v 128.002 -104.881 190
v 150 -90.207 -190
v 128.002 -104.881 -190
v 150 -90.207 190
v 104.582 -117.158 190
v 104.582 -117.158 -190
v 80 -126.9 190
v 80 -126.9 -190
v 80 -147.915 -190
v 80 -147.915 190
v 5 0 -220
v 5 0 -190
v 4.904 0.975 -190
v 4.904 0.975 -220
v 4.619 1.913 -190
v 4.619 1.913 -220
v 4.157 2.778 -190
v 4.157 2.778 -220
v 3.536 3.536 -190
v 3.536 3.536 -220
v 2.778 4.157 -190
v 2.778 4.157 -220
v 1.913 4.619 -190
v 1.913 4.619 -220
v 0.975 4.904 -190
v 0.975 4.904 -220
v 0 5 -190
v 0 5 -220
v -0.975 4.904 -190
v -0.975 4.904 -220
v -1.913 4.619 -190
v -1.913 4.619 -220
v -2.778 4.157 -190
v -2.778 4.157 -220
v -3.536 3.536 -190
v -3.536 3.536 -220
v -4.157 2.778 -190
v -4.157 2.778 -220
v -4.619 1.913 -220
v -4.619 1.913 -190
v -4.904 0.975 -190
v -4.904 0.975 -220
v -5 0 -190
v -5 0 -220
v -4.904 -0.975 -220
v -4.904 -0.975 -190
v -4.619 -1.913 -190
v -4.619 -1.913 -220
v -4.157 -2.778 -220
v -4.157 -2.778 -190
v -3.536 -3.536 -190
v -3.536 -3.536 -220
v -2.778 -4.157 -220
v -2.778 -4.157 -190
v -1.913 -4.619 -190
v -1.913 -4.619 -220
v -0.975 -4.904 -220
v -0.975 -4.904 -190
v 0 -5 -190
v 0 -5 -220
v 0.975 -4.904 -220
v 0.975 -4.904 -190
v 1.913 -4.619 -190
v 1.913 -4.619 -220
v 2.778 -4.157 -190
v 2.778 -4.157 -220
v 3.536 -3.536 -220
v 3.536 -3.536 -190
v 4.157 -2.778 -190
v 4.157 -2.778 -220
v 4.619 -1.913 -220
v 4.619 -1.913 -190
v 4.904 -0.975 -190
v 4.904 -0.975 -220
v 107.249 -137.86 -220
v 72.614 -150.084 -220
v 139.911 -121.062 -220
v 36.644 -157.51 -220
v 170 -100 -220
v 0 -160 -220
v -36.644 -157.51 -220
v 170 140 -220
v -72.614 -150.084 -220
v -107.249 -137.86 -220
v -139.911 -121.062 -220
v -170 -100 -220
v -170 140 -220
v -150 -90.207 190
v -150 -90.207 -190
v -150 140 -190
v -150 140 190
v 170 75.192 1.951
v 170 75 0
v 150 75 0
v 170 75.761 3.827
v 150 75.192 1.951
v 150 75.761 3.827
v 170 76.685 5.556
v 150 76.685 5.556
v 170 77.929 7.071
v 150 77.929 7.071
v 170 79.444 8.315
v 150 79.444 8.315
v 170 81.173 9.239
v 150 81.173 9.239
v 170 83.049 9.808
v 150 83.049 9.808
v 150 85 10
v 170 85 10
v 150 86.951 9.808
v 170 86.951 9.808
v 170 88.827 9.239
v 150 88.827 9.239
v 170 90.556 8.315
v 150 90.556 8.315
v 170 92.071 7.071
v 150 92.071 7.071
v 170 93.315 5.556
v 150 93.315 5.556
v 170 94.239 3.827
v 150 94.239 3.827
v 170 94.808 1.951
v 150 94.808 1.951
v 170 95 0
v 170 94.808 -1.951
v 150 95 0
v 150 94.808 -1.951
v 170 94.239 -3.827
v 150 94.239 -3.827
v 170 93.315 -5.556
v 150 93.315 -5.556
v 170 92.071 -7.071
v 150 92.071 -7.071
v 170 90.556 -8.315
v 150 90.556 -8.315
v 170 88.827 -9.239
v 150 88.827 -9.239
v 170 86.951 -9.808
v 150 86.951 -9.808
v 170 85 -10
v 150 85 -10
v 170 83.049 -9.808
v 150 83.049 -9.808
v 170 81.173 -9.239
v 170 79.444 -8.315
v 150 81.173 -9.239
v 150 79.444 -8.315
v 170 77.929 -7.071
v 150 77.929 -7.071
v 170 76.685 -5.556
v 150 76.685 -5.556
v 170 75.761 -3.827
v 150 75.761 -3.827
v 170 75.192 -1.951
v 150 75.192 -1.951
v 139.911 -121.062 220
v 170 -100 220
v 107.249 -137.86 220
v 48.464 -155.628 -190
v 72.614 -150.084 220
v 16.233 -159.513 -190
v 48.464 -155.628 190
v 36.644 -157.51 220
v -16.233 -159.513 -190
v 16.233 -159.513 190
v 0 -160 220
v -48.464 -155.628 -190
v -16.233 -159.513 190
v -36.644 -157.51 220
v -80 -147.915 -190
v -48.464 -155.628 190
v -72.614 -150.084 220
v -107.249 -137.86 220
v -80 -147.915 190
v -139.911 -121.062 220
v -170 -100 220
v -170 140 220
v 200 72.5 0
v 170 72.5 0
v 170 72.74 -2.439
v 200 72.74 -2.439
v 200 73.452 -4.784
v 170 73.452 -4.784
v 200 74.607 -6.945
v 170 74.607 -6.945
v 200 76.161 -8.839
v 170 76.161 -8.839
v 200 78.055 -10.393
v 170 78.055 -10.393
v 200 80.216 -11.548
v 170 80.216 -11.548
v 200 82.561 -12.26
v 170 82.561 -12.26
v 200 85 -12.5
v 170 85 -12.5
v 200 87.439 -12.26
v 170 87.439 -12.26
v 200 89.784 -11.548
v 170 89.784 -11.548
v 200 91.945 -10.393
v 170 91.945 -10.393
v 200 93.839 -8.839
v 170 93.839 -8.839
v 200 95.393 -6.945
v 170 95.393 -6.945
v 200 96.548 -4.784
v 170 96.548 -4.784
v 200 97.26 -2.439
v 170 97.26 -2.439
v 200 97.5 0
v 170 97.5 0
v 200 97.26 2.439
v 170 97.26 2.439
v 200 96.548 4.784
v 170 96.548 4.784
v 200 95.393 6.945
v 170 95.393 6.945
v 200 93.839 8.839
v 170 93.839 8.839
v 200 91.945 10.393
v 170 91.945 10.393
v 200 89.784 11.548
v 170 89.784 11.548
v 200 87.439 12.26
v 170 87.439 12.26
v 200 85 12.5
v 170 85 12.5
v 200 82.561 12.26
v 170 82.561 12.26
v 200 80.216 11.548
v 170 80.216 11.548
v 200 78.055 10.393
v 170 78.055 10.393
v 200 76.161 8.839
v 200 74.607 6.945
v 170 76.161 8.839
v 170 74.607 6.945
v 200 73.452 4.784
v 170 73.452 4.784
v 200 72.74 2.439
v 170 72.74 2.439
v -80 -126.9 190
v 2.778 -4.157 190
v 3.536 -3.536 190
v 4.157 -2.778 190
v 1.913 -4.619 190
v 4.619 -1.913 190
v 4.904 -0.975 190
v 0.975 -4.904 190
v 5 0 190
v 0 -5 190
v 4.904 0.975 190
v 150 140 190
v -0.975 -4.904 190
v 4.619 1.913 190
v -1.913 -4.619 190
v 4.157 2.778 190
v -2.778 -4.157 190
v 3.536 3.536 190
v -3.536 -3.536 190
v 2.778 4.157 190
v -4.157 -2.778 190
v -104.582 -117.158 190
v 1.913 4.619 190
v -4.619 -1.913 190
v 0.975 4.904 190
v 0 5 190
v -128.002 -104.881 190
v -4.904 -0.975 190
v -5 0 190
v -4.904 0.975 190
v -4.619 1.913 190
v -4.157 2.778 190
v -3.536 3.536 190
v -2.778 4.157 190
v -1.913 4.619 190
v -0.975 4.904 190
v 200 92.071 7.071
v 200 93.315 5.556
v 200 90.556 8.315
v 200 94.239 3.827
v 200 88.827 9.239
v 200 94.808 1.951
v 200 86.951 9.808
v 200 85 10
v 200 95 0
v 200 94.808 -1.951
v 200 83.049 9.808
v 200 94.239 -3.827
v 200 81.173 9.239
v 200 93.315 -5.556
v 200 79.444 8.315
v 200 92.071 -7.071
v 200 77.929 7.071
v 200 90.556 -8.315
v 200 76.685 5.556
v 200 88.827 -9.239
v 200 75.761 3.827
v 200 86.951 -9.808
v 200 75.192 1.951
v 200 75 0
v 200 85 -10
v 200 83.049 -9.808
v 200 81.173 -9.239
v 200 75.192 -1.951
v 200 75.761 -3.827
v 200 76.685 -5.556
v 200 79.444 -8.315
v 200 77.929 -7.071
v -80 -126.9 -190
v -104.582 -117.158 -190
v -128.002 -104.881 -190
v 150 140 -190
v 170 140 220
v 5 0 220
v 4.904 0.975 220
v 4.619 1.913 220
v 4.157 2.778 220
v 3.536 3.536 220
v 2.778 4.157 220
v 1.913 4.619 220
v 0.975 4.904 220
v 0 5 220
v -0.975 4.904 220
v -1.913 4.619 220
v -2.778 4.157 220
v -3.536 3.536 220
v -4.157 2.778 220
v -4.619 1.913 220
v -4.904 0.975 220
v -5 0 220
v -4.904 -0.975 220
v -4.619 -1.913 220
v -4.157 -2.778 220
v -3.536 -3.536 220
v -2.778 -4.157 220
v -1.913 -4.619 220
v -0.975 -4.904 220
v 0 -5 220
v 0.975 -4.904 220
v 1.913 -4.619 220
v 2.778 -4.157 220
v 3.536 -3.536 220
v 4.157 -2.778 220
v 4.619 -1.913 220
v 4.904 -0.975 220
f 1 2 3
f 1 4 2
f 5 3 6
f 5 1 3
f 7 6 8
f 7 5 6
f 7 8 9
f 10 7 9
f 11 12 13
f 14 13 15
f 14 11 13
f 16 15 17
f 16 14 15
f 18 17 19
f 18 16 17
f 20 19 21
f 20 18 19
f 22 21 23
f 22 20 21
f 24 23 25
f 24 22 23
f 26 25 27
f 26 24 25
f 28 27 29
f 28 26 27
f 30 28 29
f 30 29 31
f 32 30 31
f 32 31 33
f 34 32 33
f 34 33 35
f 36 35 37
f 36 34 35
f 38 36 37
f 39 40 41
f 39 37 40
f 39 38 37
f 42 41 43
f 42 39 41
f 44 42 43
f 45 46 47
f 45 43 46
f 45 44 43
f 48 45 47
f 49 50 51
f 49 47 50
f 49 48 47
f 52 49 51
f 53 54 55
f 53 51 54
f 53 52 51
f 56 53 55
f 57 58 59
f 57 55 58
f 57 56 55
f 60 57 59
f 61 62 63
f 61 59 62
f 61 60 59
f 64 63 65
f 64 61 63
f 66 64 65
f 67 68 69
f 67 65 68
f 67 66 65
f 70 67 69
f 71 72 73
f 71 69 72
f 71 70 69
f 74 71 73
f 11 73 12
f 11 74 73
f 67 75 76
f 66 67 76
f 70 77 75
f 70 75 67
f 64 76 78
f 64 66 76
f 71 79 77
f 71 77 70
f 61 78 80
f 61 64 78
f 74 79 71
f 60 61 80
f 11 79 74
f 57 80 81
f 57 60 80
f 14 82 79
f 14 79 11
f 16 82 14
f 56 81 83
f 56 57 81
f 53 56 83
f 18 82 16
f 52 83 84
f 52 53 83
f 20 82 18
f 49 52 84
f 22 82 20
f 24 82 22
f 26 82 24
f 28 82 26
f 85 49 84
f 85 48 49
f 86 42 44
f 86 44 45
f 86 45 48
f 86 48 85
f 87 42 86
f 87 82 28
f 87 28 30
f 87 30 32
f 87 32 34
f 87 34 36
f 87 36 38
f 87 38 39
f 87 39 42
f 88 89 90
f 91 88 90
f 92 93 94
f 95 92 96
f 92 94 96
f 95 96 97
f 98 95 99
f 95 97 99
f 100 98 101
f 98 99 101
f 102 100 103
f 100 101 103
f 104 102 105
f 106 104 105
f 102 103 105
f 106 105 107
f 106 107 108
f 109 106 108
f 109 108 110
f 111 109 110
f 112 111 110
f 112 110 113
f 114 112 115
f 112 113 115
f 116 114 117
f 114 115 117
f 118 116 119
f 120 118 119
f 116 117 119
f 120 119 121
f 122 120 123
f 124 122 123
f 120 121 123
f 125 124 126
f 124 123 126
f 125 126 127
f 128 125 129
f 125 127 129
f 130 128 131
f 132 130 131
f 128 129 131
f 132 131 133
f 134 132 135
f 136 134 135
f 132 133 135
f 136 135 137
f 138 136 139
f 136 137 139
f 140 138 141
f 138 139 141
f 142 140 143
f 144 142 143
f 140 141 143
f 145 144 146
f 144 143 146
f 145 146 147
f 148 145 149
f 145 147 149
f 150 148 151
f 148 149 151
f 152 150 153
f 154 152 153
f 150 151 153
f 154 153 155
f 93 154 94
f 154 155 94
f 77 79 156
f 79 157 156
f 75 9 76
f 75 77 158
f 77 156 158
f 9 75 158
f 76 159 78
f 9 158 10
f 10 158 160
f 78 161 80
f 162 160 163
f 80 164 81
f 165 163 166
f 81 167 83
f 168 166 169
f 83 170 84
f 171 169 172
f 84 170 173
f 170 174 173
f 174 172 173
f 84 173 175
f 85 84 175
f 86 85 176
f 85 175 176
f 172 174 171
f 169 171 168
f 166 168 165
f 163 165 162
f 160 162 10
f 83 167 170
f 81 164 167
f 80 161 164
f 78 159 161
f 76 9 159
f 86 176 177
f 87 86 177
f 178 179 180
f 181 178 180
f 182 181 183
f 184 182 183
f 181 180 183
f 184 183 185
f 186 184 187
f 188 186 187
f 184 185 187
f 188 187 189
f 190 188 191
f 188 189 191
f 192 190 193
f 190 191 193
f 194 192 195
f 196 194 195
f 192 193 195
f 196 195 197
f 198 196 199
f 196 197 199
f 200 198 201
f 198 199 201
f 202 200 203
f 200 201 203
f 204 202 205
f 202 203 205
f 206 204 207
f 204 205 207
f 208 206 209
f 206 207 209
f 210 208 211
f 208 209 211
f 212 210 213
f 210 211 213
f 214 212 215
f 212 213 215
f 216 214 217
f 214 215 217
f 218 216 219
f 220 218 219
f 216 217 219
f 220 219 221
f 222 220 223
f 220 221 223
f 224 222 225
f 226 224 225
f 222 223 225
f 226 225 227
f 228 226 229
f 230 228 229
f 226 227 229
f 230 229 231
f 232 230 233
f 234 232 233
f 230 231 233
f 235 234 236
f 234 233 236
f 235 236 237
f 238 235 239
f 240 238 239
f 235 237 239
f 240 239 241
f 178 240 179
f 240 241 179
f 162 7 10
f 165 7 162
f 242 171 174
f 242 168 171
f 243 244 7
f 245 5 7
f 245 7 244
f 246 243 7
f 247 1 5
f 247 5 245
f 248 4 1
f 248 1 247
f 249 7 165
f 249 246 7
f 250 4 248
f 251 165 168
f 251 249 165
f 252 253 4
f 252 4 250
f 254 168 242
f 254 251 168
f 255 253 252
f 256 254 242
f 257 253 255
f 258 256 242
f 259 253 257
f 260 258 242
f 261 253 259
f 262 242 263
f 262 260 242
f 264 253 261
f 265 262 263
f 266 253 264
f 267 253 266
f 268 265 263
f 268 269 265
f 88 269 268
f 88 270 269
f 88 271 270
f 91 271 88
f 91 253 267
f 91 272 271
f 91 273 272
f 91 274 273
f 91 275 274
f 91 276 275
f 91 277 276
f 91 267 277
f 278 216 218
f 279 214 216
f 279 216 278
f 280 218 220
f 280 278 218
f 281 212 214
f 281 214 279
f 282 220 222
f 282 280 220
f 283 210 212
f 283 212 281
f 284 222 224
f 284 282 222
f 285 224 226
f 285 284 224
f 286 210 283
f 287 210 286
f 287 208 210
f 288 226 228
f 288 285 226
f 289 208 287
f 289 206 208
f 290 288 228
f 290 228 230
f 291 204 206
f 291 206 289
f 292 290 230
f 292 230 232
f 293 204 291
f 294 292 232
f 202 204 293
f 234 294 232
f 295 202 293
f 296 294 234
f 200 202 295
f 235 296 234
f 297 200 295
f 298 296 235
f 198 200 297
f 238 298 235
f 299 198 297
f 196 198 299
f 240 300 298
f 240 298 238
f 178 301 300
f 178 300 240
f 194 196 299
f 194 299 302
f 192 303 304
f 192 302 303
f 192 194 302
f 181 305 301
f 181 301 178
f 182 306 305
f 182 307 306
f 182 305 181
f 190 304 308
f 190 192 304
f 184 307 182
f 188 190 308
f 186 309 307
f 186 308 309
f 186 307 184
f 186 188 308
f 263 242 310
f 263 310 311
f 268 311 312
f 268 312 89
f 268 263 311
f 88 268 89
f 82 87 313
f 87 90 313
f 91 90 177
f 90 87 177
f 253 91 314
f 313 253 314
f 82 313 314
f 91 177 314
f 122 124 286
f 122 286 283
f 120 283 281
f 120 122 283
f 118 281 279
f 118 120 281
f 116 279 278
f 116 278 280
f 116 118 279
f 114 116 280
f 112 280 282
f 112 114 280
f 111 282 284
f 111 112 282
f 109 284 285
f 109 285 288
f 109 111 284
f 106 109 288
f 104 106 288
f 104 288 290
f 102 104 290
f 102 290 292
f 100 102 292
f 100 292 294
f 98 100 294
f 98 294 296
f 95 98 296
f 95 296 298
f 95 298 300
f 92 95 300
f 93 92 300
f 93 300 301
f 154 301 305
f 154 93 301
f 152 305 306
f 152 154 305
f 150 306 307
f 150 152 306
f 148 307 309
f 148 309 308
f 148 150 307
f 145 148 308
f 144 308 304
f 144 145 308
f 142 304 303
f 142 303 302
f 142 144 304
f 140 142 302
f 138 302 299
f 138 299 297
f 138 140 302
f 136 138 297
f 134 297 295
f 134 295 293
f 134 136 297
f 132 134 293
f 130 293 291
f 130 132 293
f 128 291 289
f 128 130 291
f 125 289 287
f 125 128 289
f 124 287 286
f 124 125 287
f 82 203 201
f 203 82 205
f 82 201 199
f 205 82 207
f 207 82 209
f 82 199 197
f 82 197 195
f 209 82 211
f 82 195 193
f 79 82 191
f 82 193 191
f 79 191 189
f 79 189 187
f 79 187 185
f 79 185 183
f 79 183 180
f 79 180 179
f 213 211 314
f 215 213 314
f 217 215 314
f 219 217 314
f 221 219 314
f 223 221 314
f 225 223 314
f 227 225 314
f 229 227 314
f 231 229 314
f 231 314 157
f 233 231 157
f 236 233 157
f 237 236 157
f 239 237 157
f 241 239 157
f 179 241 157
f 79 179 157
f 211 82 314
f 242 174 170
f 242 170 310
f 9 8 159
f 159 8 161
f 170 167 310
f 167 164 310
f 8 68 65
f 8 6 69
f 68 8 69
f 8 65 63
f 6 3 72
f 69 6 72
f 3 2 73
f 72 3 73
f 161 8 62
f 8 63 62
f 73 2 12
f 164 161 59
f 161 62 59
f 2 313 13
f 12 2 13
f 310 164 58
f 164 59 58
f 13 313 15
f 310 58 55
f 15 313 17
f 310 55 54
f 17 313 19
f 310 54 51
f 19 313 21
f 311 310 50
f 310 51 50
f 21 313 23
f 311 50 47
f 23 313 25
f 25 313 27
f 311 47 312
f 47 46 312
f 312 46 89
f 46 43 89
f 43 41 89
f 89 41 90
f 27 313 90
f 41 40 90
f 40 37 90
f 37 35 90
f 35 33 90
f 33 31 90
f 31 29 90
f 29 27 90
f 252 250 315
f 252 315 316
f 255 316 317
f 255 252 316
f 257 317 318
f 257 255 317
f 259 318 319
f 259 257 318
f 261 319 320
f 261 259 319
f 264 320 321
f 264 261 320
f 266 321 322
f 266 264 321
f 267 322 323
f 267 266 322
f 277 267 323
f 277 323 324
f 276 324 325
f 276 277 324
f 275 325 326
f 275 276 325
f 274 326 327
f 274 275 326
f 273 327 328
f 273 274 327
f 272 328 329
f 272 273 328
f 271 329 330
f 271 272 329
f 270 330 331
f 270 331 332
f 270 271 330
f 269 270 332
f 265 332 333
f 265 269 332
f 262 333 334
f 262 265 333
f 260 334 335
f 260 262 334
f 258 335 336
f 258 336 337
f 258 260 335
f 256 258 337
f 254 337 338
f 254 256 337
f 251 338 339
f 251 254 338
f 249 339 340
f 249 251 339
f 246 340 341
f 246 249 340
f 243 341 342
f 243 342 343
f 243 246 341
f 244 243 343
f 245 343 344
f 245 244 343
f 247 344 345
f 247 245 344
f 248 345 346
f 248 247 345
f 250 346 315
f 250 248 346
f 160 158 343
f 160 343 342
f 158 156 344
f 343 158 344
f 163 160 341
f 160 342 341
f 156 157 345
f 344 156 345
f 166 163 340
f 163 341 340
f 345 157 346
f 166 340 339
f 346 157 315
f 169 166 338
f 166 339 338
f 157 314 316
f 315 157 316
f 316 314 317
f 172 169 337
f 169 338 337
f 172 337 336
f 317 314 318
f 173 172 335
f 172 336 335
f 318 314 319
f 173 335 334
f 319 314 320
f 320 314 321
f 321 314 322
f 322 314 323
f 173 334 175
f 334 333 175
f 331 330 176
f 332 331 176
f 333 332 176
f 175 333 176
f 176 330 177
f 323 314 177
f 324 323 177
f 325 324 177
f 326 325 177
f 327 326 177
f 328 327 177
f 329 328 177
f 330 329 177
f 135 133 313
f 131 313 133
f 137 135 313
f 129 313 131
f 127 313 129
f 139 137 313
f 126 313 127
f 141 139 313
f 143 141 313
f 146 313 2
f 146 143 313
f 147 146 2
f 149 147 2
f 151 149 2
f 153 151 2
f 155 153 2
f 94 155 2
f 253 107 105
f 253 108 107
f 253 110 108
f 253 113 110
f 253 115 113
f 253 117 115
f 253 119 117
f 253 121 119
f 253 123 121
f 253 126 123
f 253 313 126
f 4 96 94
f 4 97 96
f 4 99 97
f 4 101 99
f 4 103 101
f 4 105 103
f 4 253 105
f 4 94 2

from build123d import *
from build123d.topology import SkipClean

# Parameters (mm, degrees)
SKETCH1_R           = 5
BOSS_EXTRUDE1_DEPTH = 220
CUT_EXTRUDE1_DEPTH  = 190
SKETCH4_R           = 10
CUT_EXTRUDE2_DEPTH  = 190
SKETCH5_R           = 12.5
SKETCH5_R_2         = 10
BOSS_EXTRUDE2_DEPTH = 30


with BuildPart() as part:
    # Sketch1 → Boss-Extrude1 (new, symmetric)
    with BuildSketch(Plane.XY):
        with BuildLine():
            Line((-170, 140), (170, 140))
            Line((170, 140), (170, -100))
            ThreePointArc((170, -100), (0, -160), (-170, -100))
            Line((-170, -100), (-170, 140))
        make_face()
        Circle(SKETCH1_R, mode=Mode.SUBTRACT)
    extrude(amount=BOSS_EXTRUDE1_DEPTH, both=True)

    # Sketch3 → Cut-Extrude1 (cut, symmetric)
    with BuildSketch(Plane.XY):
        with BuildLine():
            Line((-150, 140), (150, 140))
            Line((150, 140), (150, -90.207361828))
            ThreePointArc((150, -90.207361828), (116.45426588, -111.328240908), (80, -126.900469714))
            Line((80, -126.900469714), (80, -159.889880276))
            ThreePointArc((80, -159.889880276), (0, -171.462714083), (-80, -159.889880276))
            Line((-80, -159.889880276), (-80, -126.900469714))
            ThreePointArc((-80, -126.900469714), (-116.45426588, -111.328240908), (-150, -90.207361828))
            Line((-150, -90.207361828), (-150, 140))
        make_face()
    extrude(amount=CUT_EXTRUDE1_DEPTH, both=True, mode=Mode.SUBTRACT)

    # Sketch4 → Cut-Extrude2 (cut, symmetric)
    with BuildSketch(Plane.ZY.offset(-150)):
        with Locations(Location((0, 85, 0), (0, 0, 270))):
            Circle(SKETCH4_R)
    extrude(amount=CUT_EXTRUDE2_DEPTH, both=True, mode=Mode.SUBTRACT)

    # Sketch5 → Boss-Extrude2 (add)
    with SkipClean():  # the faces are left unmerged after this step: merging them gives an invalid solid
        with BuildSketch(Plane(origin=(170, 0, 0), x_dir=(0, 0, -1), z_dir=(1, 0, 0))):
            with Locations(Location((0, 85, 0), (0, 0, 270))):
                Circle(SKETCH5_R)
            with Locations(Location((0, 85, 0), (0, 0, 90))):
                Circle(SKETCH5_R_2, mode=Mode.SUBTRACT)
        extrude(amount=BOSS_EXTRUDE2_DEPTH)


solid = part.part
